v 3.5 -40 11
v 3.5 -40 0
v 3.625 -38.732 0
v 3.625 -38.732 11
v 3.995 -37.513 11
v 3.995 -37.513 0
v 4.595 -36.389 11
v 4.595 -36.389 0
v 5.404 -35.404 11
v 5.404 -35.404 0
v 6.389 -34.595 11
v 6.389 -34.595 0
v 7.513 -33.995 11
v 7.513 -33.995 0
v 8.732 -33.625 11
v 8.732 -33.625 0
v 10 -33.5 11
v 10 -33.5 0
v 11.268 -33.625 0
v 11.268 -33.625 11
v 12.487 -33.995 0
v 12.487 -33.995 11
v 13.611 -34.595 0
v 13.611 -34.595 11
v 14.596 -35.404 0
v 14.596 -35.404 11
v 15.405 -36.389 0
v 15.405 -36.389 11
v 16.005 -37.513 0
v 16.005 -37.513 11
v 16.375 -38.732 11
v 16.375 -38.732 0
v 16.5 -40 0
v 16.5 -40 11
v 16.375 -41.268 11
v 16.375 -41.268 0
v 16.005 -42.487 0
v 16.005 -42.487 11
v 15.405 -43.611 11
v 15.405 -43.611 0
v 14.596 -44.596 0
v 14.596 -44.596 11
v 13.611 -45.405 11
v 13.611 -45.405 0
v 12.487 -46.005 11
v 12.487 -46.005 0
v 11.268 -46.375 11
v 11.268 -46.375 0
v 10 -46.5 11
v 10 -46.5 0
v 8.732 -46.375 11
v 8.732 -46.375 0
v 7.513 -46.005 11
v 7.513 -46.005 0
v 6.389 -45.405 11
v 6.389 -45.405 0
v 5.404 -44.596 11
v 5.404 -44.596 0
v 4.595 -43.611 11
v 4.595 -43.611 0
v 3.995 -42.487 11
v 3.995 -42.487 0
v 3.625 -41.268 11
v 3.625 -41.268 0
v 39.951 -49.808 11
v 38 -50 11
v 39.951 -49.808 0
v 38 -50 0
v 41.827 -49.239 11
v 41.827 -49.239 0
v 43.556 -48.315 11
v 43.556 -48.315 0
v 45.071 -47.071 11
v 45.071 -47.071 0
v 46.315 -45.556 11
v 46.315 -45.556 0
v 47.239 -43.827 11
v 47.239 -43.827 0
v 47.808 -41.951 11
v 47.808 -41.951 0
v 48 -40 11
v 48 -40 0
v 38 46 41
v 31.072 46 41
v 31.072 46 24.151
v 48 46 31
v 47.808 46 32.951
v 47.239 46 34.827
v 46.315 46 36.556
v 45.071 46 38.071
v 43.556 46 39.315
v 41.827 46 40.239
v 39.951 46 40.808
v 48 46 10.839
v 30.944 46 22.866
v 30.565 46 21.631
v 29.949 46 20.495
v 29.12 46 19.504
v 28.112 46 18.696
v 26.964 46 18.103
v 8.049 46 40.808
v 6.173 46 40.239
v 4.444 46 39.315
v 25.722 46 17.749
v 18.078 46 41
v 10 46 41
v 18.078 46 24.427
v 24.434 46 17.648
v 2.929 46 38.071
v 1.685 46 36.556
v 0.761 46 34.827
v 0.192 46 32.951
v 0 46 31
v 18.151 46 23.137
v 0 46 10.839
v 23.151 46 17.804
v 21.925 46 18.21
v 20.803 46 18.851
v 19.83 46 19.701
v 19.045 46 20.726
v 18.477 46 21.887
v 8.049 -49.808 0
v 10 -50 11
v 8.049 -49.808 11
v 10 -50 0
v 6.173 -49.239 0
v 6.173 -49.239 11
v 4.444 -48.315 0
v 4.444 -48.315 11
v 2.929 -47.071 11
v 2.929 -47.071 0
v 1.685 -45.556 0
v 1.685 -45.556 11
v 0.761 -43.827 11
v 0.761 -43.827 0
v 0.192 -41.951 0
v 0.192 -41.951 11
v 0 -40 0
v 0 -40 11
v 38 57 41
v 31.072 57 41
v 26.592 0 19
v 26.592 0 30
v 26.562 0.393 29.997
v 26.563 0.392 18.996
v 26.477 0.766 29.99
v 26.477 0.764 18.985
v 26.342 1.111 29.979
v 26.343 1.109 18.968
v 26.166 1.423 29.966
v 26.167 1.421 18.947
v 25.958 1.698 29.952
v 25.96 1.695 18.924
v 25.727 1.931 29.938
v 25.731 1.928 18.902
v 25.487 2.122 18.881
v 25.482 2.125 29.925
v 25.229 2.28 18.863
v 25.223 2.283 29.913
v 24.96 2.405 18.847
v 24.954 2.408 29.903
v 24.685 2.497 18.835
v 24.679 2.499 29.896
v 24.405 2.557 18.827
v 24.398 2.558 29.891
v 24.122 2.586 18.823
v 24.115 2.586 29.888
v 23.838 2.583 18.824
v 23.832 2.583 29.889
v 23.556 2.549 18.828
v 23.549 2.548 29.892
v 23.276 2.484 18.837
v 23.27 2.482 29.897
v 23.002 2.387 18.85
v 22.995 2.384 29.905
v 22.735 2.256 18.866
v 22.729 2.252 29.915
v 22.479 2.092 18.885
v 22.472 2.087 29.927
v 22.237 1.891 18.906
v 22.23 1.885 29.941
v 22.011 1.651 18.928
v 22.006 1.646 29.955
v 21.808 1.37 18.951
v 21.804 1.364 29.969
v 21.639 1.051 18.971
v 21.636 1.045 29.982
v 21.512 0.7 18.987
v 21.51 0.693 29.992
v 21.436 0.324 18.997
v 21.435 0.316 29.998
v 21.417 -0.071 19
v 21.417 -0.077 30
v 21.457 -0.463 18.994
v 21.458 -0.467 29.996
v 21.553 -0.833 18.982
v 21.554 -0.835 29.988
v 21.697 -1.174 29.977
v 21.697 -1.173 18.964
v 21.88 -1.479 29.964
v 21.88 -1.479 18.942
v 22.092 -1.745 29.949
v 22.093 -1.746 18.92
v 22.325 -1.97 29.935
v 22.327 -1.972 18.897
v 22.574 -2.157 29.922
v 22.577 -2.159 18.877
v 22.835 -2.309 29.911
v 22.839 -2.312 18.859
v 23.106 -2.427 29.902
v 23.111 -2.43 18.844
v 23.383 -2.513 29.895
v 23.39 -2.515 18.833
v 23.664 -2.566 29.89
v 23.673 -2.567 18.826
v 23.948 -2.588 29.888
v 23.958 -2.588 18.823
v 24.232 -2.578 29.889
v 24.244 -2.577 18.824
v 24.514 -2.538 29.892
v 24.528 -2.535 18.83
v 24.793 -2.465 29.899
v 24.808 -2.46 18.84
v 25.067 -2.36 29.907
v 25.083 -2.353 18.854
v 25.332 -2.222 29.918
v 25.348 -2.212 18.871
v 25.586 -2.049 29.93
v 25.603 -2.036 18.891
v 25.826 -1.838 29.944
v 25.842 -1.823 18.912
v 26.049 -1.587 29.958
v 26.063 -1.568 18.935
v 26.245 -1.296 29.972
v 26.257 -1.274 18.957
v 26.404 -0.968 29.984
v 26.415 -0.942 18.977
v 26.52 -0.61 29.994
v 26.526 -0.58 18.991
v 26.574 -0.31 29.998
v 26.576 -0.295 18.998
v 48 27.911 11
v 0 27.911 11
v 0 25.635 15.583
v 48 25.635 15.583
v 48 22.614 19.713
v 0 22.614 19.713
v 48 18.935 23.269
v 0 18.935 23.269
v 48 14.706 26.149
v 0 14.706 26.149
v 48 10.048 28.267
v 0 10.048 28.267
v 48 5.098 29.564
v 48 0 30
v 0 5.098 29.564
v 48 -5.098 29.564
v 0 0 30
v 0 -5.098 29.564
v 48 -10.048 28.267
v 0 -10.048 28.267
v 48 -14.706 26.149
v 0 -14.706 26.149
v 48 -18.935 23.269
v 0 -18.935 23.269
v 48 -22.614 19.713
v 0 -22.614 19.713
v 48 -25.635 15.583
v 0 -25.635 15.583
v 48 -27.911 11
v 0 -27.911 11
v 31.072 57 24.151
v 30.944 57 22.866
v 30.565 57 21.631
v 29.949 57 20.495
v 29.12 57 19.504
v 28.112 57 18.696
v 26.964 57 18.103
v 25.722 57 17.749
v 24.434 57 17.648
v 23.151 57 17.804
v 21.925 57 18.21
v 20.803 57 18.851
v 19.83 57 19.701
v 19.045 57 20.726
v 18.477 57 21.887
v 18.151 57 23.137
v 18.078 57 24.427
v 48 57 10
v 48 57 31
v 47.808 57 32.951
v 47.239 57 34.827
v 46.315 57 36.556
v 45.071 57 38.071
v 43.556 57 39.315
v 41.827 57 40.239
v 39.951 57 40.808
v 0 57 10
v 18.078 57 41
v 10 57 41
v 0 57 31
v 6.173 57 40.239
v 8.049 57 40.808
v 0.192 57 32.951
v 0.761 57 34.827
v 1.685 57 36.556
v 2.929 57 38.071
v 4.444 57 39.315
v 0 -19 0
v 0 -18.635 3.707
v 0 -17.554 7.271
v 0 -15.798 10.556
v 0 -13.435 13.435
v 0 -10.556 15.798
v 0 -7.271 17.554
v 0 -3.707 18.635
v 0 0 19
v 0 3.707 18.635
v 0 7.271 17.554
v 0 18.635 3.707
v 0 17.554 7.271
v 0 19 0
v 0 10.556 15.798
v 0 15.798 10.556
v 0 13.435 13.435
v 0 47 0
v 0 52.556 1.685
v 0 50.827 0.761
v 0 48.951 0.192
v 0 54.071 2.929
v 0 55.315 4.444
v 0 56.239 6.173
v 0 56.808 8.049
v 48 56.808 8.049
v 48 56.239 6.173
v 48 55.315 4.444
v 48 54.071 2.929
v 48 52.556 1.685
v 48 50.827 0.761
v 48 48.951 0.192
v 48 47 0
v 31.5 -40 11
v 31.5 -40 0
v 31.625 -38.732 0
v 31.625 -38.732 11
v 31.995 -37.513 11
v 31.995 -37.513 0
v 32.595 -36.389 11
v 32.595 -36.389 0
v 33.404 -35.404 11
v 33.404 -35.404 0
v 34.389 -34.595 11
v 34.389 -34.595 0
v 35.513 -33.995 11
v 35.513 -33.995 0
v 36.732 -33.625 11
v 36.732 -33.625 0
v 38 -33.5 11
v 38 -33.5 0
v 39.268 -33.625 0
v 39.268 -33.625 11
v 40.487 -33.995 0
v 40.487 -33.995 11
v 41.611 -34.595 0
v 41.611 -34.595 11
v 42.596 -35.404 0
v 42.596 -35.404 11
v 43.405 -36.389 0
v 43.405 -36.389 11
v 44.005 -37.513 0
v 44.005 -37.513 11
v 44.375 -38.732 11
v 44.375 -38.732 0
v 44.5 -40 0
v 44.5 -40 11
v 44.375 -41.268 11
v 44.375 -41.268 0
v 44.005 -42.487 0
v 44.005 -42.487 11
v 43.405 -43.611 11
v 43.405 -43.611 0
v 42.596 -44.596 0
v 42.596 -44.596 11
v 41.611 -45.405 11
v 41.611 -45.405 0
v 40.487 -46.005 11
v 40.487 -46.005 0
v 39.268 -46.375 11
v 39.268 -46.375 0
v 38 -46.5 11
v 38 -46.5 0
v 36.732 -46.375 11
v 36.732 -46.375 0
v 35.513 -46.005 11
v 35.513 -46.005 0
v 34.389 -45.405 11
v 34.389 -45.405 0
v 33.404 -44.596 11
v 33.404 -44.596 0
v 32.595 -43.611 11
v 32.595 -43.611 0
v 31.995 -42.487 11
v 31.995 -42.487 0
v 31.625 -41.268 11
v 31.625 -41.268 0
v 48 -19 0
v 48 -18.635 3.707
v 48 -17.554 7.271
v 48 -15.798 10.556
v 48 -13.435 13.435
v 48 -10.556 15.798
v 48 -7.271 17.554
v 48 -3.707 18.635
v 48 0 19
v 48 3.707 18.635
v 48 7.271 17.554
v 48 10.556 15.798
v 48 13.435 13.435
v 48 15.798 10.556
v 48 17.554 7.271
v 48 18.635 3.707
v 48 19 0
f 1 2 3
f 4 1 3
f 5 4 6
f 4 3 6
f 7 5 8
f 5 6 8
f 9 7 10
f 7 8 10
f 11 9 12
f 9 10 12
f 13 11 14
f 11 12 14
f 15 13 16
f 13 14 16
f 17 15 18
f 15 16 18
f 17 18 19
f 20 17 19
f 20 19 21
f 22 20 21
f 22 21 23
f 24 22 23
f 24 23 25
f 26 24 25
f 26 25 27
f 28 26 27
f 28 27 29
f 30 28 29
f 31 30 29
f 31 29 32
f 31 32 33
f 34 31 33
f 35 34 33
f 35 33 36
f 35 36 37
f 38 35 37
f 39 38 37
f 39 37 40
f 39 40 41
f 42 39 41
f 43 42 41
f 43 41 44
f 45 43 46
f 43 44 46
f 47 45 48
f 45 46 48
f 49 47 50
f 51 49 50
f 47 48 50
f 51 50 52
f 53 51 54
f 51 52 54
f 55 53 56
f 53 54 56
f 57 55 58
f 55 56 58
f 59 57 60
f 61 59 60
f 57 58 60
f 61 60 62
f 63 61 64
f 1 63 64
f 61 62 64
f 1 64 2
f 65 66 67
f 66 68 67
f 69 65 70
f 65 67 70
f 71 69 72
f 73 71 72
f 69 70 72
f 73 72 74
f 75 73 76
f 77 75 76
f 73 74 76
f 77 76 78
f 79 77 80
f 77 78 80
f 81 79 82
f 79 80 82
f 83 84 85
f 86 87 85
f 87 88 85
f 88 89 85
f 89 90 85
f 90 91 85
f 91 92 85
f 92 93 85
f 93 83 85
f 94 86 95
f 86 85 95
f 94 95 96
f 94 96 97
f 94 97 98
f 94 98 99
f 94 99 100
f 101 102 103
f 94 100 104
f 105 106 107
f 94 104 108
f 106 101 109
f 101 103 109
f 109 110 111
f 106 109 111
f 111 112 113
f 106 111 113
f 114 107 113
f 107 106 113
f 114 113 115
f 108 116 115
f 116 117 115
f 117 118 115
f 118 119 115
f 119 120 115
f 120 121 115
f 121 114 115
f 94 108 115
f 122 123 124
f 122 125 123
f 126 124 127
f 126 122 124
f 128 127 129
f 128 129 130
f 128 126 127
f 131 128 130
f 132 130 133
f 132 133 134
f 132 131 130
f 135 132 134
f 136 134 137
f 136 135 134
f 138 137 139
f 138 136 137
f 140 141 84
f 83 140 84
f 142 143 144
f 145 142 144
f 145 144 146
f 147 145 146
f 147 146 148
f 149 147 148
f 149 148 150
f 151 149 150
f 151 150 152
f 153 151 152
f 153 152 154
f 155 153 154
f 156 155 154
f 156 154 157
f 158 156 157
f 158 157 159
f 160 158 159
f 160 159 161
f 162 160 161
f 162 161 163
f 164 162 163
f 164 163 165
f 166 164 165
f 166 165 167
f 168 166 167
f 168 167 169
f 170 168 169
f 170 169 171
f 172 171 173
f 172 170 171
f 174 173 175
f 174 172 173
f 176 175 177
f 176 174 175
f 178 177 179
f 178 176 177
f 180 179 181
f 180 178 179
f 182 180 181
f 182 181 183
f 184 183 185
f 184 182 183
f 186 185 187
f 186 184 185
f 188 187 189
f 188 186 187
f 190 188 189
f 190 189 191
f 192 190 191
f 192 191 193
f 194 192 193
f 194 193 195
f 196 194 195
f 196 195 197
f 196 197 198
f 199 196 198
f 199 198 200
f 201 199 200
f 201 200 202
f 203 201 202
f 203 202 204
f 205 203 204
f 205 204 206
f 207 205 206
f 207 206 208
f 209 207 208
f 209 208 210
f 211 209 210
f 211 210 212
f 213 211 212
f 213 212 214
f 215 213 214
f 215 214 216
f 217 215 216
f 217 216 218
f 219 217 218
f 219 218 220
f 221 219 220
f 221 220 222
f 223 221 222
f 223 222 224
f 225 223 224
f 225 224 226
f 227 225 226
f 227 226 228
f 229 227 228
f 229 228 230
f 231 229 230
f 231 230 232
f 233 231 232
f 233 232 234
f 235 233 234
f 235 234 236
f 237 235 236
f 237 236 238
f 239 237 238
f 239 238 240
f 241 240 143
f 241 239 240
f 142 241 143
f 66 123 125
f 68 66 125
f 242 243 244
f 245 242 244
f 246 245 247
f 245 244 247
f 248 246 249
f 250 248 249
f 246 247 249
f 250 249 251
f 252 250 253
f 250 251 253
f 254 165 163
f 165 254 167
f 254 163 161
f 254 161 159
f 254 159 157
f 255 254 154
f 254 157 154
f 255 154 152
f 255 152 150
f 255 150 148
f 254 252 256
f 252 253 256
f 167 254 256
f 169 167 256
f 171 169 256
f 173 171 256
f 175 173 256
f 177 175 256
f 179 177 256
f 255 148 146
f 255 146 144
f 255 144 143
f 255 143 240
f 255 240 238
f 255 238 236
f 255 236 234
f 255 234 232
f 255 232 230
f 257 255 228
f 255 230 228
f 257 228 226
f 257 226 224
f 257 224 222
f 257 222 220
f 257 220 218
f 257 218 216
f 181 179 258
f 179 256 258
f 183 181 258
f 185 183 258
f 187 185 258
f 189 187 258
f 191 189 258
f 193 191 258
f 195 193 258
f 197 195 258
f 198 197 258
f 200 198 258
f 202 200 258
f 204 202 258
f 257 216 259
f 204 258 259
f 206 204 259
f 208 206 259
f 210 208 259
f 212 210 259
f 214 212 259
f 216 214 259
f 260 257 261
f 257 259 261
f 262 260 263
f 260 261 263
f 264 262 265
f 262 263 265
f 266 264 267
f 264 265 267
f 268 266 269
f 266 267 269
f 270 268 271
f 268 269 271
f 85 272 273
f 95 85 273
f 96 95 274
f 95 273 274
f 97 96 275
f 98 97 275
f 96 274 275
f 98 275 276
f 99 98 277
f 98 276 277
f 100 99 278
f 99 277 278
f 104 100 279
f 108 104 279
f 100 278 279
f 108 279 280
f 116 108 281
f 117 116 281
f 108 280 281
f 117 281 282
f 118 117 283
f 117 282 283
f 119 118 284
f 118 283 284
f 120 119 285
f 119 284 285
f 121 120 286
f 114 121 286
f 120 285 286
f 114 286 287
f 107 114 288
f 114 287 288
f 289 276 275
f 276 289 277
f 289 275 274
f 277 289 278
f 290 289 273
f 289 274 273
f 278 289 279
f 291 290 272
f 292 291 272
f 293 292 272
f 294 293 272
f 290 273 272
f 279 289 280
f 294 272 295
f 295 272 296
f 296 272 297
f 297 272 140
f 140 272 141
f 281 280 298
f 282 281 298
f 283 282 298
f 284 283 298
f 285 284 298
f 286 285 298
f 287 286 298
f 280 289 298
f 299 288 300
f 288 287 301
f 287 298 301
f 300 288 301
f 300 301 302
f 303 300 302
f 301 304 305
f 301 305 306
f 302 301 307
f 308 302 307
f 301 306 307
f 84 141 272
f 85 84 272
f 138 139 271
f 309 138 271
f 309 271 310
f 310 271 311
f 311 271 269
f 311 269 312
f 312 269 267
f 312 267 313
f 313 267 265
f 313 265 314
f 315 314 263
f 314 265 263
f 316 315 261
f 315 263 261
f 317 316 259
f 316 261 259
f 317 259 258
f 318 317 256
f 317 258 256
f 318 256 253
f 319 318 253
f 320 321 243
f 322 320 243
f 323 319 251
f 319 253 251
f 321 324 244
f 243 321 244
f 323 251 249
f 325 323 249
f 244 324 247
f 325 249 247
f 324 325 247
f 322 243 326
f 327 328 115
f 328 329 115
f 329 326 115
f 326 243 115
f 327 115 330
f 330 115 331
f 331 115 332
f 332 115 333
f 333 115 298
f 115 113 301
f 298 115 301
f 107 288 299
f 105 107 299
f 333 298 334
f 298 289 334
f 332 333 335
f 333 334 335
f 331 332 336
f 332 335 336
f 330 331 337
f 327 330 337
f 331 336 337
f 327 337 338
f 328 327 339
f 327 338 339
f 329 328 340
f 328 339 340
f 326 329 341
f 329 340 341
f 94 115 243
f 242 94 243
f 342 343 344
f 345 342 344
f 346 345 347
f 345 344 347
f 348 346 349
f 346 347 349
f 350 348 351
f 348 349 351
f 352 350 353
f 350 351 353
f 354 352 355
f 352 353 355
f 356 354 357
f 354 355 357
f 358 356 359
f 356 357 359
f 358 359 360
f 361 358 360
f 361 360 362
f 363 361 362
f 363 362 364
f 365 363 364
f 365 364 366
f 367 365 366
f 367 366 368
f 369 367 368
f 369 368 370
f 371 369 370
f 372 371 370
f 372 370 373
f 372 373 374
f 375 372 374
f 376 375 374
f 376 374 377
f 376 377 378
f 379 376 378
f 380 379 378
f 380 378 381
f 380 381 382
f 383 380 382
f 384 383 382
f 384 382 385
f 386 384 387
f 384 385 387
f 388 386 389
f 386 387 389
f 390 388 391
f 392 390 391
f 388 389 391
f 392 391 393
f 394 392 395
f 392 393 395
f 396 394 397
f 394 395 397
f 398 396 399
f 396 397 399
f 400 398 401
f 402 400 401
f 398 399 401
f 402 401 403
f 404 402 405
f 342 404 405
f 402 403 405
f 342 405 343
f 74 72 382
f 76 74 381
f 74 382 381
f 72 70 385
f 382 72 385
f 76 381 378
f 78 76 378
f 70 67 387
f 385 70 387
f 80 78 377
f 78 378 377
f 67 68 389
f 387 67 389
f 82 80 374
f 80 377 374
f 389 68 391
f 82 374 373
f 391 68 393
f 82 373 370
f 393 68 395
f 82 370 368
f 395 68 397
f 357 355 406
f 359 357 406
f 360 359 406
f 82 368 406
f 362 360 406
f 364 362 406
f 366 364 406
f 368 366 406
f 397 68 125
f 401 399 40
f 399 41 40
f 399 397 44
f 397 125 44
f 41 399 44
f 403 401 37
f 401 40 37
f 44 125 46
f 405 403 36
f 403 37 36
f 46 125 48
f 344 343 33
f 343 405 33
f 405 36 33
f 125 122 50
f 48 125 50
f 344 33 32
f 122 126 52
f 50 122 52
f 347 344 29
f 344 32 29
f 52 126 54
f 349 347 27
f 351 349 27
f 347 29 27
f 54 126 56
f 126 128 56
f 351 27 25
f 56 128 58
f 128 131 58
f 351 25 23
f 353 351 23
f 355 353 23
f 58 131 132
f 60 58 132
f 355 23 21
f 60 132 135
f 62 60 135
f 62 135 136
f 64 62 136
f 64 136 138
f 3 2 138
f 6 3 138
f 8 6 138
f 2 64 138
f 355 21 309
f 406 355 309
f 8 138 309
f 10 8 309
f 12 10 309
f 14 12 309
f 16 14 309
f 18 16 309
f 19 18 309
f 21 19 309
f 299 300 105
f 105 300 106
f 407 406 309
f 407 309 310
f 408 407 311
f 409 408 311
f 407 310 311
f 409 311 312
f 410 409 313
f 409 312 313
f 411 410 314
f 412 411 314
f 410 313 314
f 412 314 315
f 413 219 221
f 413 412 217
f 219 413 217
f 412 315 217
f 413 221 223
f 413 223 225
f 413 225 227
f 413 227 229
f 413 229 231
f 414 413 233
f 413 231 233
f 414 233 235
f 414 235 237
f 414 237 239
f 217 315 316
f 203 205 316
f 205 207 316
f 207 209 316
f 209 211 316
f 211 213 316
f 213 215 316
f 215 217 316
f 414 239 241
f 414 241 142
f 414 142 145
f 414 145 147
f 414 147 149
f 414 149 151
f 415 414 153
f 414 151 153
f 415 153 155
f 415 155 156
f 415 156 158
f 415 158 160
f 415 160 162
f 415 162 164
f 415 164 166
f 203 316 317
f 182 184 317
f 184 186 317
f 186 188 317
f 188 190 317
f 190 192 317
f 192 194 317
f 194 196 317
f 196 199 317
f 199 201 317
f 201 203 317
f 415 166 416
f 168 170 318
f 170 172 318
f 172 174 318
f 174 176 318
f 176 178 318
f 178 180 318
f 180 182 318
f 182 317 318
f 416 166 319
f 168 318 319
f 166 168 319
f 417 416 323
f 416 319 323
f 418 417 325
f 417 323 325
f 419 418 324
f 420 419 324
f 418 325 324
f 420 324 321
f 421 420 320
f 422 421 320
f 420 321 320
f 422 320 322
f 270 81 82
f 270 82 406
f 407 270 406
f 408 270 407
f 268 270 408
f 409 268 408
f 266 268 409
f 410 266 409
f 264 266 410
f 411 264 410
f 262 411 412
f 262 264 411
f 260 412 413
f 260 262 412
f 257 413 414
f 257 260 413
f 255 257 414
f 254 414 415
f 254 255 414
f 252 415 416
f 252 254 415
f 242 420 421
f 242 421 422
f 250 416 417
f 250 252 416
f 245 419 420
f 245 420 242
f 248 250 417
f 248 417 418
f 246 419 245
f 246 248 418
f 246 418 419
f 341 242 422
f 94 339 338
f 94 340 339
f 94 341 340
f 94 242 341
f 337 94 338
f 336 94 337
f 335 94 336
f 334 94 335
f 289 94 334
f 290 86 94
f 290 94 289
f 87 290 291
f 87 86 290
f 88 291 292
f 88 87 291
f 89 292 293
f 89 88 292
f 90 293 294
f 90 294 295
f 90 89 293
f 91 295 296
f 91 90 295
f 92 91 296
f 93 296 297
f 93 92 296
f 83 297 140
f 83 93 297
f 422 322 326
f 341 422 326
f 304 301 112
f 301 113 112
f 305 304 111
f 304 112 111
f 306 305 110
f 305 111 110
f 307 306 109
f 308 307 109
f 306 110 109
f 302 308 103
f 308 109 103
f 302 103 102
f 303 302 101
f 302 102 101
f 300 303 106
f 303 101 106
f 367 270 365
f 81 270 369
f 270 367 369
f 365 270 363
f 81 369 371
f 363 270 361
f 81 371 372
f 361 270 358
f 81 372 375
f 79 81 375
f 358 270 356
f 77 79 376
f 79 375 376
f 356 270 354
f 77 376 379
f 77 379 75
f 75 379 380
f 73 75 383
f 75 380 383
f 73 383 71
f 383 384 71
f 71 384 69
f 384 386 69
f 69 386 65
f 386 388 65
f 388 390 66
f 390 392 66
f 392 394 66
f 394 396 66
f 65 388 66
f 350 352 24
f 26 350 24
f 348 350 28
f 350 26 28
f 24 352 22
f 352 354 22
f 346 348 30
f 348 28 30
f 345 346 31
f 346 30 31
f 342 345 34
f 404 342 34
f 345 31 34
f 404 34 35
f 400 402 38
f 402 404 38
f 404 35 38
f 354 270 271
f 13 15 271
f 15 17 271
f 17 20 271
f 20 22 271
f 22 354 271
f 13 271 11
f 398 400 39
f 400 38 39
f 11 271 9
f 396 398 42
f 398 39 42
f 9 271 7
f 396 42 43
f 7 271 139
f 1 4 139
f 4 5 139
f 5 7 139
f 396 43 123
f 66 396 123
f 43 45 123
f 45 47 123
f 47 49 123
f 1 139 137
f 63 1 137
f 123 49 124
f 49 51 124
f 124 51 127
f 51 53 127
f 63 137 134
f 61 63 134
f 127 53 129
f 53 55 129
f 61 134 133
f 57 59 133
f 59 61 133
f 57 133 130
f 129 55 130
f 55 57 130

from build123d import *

# Parameters (mm, degrees)
F1_DEPTH  = 48
F2_R      = 10
F3_R      = 10
F5_D      = 13
F8_DEPTH  = 25
F6_R      = 2.5
F9_DEPTH  = 25
F10_R     = 2.5883727543
F11_DEPTH = 35


with BuildPart() as f1:
    # F0 (on Right) → F1 (new body)
    with BuildSketch(Plane.YZ):
        with BuildLine():
            ThreePointArc((27.9105714739, 11), (29.4730143031, 5.5983415304), (30, 0))
            Line((30, 0), (57, 0))
            Line((57, 0), (57, 41))
            Line((57, 41), (46, 41))
            Line((46, 41), (46, 10.8391446993))
            Line((46, 10.8391446993), (27.9105714739, 11))
        make_face()
        with BuildLine():
            Line((-50, 0), (-30, 0))
            ThreePointArc((-30, 0), (-29.4730143031, 5.5983415304), (-27.9105714739, 11))
            Line((-27.9105714739, 11), (-50, 11))
            Line((-50, 11), (-50, 0))
        make_face()
        with BuildLine():
            ThreePointArc((-19, 0), (0, 19), (19, 0))
            Line((19, 0), (30, 0))
            ThreePointArc((30, 0), (29.4730143031, 5.5983415304), (27.9105714739, 11))
            ThreePointArc((27.9105714739, 11), (0, 30), (-27.9105714739, 11))
            ThreePointArc((-27.9105714739, 11), (-29.4730143031, 5.5983415304), (-30, 0))
            Line((-30, 0), (-19, 0))
        make_face()
    extrude(amount=F1_DEPTH)

    # F2
    f2_edges = [f1.edges().sort_by_distance(p)[0] for p in [
        (0, -50, 5.5),
    ]]
    fillet(f2_edges, radius=F2_R)

    # F3
    f3_edges = [f1.edges().sort_by_distance(p)[0] for p in [
        (48, -50, 5.5),
        (48, 51.5, 41),
        (0, 51.5, 41),
        (24, 57, 0),
    ]]
    fillet(f3_edges, radius=F3_R)

    # F5 (through all)
    with Locations(Plane.XY.offset(11)):
        with Locations((38, -40), (10, -40)):
            Hole(F5_D / 2)

    # F7 (on face) → F8 (cut)
    with BuildSketch(Plane(origin=(0, 57, 0), x_dir=(-1, 0, 0), z_dir=(0, 1, 0))):
        with BuildLine():
            Line((-31.0717061657, 41), (-31.0717061657, 24.151092889))
            ThreePointArc((-31.0717061657, 24.151092889), (-24.4338531361, 17.6483010112), (-18.0777366792, 24.4267358331))
            Line((-18.0777366792, 24.4267358331), (-18.0777366792, 41))
            Line((-18.0777366792, 41), (-31.0717061657, 41))
        make_face()
    extrude(amount=-F8_DEPTH, mode=Mode.SUBTRACT)

    # F6 (on Top) → F9 (cut)
    with BuildSketch(Plane.XY):
        with Locations((23.1874617344, 0)):
            Circle(F6_R)
    extrude(amount=-F9_DEPTH, mode=Mode.SUBTRACT)

    # F10 (on Top) → F11 (cut)
    with BuildSketch(Plane.XY):
        with Locations((24.0040104836, 0)):
            Circle(F10_R)
    extrude(amount=F11_DEPTH, mode=Mode.SUBTRACT)


solid = f1.part
